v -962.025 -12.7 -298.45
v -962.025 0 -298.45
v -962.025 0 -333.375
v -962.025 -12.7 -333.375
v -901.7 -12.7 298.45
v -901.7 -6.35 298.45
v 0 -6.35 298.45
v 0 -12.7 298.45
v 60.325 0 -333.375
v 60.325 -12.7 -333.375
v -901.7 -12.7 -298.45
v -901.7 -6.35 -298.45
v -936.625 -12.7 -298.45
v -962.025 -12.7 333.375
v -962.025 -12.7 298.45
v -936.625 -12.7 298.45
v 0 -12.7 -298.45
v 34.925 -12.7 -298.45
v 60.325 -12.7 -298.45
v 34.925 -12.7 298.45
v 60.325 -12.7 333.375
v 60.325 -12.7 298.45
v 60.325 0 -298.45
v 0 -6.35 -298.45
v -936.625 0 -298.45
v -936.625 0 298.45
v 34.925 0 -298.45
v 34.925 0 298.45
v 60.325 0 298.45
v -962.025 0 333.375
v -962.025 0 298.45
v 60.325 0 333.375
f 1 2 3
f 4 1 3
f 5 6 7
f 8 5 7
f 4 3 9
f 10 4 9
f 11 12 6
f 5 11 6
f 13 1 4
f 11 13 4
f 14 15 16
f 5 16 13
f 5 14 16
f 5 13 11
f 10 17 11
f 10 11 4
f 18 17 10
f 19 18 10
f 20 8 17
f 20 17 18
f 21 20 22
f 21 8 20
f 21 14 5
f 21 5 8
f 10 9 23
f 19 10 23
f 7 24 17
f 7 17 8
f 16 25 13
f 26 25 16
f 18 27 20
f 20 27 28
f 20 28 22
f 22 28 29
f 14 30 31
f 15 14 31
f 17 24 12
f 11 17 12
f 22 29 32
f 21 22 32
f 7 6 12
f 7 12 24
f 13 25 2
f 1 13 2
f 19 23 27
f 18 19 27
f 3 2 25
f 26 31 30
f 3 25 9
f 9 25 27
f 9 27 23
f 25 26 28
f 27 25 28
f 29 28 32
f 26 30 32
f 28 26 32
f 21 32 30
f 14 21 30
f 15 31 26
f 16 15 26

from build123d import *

# Parameters (mm, degrees)
F0_W     = 901.7
F0_H     = 596.9
F1_DEPTH = 6.35
F0_W_2   = 34.925
F2_DEPTH = 12.7


with BuildPart() as f1:
    # F0 (on Front) → F1 (new body)
    with BuildSketch(Plane.XZ):
        with Locations((-450.85, 0)):
            Rectangle(F0_W, F0_H)
    extrude(amount=F1_DEPTH)

    # F0 (on Front) → F2 (join)
    with BuildSketch(Plane.XZ):
        Polygon((-936.625, 298.45), (-901.7, 298.45), (0, 298.45), (34.925, 298.45), (60.325, 298.45), (60.325, 333.375), (-962.025, 333.375), (-962.025, 298.45), align=None)
        with Locations((-919.1625, 0)):
            Rectangle(F0_W_2, F0_H)
        with Locations((17.4625, 0)):
            Rectangle(F0_W_2, F0_H)
        Polygon((0, -298.45), (-901.7, -298.45), (-936.625, -298.45), (-962.025, -298.45), (-962.025, -333.375), (60.325, -333.375), (60.325, -298.45), (34.925, -298.45), align=None)
    extrude(amount=F2_DEPTH)


solid = f1.part
